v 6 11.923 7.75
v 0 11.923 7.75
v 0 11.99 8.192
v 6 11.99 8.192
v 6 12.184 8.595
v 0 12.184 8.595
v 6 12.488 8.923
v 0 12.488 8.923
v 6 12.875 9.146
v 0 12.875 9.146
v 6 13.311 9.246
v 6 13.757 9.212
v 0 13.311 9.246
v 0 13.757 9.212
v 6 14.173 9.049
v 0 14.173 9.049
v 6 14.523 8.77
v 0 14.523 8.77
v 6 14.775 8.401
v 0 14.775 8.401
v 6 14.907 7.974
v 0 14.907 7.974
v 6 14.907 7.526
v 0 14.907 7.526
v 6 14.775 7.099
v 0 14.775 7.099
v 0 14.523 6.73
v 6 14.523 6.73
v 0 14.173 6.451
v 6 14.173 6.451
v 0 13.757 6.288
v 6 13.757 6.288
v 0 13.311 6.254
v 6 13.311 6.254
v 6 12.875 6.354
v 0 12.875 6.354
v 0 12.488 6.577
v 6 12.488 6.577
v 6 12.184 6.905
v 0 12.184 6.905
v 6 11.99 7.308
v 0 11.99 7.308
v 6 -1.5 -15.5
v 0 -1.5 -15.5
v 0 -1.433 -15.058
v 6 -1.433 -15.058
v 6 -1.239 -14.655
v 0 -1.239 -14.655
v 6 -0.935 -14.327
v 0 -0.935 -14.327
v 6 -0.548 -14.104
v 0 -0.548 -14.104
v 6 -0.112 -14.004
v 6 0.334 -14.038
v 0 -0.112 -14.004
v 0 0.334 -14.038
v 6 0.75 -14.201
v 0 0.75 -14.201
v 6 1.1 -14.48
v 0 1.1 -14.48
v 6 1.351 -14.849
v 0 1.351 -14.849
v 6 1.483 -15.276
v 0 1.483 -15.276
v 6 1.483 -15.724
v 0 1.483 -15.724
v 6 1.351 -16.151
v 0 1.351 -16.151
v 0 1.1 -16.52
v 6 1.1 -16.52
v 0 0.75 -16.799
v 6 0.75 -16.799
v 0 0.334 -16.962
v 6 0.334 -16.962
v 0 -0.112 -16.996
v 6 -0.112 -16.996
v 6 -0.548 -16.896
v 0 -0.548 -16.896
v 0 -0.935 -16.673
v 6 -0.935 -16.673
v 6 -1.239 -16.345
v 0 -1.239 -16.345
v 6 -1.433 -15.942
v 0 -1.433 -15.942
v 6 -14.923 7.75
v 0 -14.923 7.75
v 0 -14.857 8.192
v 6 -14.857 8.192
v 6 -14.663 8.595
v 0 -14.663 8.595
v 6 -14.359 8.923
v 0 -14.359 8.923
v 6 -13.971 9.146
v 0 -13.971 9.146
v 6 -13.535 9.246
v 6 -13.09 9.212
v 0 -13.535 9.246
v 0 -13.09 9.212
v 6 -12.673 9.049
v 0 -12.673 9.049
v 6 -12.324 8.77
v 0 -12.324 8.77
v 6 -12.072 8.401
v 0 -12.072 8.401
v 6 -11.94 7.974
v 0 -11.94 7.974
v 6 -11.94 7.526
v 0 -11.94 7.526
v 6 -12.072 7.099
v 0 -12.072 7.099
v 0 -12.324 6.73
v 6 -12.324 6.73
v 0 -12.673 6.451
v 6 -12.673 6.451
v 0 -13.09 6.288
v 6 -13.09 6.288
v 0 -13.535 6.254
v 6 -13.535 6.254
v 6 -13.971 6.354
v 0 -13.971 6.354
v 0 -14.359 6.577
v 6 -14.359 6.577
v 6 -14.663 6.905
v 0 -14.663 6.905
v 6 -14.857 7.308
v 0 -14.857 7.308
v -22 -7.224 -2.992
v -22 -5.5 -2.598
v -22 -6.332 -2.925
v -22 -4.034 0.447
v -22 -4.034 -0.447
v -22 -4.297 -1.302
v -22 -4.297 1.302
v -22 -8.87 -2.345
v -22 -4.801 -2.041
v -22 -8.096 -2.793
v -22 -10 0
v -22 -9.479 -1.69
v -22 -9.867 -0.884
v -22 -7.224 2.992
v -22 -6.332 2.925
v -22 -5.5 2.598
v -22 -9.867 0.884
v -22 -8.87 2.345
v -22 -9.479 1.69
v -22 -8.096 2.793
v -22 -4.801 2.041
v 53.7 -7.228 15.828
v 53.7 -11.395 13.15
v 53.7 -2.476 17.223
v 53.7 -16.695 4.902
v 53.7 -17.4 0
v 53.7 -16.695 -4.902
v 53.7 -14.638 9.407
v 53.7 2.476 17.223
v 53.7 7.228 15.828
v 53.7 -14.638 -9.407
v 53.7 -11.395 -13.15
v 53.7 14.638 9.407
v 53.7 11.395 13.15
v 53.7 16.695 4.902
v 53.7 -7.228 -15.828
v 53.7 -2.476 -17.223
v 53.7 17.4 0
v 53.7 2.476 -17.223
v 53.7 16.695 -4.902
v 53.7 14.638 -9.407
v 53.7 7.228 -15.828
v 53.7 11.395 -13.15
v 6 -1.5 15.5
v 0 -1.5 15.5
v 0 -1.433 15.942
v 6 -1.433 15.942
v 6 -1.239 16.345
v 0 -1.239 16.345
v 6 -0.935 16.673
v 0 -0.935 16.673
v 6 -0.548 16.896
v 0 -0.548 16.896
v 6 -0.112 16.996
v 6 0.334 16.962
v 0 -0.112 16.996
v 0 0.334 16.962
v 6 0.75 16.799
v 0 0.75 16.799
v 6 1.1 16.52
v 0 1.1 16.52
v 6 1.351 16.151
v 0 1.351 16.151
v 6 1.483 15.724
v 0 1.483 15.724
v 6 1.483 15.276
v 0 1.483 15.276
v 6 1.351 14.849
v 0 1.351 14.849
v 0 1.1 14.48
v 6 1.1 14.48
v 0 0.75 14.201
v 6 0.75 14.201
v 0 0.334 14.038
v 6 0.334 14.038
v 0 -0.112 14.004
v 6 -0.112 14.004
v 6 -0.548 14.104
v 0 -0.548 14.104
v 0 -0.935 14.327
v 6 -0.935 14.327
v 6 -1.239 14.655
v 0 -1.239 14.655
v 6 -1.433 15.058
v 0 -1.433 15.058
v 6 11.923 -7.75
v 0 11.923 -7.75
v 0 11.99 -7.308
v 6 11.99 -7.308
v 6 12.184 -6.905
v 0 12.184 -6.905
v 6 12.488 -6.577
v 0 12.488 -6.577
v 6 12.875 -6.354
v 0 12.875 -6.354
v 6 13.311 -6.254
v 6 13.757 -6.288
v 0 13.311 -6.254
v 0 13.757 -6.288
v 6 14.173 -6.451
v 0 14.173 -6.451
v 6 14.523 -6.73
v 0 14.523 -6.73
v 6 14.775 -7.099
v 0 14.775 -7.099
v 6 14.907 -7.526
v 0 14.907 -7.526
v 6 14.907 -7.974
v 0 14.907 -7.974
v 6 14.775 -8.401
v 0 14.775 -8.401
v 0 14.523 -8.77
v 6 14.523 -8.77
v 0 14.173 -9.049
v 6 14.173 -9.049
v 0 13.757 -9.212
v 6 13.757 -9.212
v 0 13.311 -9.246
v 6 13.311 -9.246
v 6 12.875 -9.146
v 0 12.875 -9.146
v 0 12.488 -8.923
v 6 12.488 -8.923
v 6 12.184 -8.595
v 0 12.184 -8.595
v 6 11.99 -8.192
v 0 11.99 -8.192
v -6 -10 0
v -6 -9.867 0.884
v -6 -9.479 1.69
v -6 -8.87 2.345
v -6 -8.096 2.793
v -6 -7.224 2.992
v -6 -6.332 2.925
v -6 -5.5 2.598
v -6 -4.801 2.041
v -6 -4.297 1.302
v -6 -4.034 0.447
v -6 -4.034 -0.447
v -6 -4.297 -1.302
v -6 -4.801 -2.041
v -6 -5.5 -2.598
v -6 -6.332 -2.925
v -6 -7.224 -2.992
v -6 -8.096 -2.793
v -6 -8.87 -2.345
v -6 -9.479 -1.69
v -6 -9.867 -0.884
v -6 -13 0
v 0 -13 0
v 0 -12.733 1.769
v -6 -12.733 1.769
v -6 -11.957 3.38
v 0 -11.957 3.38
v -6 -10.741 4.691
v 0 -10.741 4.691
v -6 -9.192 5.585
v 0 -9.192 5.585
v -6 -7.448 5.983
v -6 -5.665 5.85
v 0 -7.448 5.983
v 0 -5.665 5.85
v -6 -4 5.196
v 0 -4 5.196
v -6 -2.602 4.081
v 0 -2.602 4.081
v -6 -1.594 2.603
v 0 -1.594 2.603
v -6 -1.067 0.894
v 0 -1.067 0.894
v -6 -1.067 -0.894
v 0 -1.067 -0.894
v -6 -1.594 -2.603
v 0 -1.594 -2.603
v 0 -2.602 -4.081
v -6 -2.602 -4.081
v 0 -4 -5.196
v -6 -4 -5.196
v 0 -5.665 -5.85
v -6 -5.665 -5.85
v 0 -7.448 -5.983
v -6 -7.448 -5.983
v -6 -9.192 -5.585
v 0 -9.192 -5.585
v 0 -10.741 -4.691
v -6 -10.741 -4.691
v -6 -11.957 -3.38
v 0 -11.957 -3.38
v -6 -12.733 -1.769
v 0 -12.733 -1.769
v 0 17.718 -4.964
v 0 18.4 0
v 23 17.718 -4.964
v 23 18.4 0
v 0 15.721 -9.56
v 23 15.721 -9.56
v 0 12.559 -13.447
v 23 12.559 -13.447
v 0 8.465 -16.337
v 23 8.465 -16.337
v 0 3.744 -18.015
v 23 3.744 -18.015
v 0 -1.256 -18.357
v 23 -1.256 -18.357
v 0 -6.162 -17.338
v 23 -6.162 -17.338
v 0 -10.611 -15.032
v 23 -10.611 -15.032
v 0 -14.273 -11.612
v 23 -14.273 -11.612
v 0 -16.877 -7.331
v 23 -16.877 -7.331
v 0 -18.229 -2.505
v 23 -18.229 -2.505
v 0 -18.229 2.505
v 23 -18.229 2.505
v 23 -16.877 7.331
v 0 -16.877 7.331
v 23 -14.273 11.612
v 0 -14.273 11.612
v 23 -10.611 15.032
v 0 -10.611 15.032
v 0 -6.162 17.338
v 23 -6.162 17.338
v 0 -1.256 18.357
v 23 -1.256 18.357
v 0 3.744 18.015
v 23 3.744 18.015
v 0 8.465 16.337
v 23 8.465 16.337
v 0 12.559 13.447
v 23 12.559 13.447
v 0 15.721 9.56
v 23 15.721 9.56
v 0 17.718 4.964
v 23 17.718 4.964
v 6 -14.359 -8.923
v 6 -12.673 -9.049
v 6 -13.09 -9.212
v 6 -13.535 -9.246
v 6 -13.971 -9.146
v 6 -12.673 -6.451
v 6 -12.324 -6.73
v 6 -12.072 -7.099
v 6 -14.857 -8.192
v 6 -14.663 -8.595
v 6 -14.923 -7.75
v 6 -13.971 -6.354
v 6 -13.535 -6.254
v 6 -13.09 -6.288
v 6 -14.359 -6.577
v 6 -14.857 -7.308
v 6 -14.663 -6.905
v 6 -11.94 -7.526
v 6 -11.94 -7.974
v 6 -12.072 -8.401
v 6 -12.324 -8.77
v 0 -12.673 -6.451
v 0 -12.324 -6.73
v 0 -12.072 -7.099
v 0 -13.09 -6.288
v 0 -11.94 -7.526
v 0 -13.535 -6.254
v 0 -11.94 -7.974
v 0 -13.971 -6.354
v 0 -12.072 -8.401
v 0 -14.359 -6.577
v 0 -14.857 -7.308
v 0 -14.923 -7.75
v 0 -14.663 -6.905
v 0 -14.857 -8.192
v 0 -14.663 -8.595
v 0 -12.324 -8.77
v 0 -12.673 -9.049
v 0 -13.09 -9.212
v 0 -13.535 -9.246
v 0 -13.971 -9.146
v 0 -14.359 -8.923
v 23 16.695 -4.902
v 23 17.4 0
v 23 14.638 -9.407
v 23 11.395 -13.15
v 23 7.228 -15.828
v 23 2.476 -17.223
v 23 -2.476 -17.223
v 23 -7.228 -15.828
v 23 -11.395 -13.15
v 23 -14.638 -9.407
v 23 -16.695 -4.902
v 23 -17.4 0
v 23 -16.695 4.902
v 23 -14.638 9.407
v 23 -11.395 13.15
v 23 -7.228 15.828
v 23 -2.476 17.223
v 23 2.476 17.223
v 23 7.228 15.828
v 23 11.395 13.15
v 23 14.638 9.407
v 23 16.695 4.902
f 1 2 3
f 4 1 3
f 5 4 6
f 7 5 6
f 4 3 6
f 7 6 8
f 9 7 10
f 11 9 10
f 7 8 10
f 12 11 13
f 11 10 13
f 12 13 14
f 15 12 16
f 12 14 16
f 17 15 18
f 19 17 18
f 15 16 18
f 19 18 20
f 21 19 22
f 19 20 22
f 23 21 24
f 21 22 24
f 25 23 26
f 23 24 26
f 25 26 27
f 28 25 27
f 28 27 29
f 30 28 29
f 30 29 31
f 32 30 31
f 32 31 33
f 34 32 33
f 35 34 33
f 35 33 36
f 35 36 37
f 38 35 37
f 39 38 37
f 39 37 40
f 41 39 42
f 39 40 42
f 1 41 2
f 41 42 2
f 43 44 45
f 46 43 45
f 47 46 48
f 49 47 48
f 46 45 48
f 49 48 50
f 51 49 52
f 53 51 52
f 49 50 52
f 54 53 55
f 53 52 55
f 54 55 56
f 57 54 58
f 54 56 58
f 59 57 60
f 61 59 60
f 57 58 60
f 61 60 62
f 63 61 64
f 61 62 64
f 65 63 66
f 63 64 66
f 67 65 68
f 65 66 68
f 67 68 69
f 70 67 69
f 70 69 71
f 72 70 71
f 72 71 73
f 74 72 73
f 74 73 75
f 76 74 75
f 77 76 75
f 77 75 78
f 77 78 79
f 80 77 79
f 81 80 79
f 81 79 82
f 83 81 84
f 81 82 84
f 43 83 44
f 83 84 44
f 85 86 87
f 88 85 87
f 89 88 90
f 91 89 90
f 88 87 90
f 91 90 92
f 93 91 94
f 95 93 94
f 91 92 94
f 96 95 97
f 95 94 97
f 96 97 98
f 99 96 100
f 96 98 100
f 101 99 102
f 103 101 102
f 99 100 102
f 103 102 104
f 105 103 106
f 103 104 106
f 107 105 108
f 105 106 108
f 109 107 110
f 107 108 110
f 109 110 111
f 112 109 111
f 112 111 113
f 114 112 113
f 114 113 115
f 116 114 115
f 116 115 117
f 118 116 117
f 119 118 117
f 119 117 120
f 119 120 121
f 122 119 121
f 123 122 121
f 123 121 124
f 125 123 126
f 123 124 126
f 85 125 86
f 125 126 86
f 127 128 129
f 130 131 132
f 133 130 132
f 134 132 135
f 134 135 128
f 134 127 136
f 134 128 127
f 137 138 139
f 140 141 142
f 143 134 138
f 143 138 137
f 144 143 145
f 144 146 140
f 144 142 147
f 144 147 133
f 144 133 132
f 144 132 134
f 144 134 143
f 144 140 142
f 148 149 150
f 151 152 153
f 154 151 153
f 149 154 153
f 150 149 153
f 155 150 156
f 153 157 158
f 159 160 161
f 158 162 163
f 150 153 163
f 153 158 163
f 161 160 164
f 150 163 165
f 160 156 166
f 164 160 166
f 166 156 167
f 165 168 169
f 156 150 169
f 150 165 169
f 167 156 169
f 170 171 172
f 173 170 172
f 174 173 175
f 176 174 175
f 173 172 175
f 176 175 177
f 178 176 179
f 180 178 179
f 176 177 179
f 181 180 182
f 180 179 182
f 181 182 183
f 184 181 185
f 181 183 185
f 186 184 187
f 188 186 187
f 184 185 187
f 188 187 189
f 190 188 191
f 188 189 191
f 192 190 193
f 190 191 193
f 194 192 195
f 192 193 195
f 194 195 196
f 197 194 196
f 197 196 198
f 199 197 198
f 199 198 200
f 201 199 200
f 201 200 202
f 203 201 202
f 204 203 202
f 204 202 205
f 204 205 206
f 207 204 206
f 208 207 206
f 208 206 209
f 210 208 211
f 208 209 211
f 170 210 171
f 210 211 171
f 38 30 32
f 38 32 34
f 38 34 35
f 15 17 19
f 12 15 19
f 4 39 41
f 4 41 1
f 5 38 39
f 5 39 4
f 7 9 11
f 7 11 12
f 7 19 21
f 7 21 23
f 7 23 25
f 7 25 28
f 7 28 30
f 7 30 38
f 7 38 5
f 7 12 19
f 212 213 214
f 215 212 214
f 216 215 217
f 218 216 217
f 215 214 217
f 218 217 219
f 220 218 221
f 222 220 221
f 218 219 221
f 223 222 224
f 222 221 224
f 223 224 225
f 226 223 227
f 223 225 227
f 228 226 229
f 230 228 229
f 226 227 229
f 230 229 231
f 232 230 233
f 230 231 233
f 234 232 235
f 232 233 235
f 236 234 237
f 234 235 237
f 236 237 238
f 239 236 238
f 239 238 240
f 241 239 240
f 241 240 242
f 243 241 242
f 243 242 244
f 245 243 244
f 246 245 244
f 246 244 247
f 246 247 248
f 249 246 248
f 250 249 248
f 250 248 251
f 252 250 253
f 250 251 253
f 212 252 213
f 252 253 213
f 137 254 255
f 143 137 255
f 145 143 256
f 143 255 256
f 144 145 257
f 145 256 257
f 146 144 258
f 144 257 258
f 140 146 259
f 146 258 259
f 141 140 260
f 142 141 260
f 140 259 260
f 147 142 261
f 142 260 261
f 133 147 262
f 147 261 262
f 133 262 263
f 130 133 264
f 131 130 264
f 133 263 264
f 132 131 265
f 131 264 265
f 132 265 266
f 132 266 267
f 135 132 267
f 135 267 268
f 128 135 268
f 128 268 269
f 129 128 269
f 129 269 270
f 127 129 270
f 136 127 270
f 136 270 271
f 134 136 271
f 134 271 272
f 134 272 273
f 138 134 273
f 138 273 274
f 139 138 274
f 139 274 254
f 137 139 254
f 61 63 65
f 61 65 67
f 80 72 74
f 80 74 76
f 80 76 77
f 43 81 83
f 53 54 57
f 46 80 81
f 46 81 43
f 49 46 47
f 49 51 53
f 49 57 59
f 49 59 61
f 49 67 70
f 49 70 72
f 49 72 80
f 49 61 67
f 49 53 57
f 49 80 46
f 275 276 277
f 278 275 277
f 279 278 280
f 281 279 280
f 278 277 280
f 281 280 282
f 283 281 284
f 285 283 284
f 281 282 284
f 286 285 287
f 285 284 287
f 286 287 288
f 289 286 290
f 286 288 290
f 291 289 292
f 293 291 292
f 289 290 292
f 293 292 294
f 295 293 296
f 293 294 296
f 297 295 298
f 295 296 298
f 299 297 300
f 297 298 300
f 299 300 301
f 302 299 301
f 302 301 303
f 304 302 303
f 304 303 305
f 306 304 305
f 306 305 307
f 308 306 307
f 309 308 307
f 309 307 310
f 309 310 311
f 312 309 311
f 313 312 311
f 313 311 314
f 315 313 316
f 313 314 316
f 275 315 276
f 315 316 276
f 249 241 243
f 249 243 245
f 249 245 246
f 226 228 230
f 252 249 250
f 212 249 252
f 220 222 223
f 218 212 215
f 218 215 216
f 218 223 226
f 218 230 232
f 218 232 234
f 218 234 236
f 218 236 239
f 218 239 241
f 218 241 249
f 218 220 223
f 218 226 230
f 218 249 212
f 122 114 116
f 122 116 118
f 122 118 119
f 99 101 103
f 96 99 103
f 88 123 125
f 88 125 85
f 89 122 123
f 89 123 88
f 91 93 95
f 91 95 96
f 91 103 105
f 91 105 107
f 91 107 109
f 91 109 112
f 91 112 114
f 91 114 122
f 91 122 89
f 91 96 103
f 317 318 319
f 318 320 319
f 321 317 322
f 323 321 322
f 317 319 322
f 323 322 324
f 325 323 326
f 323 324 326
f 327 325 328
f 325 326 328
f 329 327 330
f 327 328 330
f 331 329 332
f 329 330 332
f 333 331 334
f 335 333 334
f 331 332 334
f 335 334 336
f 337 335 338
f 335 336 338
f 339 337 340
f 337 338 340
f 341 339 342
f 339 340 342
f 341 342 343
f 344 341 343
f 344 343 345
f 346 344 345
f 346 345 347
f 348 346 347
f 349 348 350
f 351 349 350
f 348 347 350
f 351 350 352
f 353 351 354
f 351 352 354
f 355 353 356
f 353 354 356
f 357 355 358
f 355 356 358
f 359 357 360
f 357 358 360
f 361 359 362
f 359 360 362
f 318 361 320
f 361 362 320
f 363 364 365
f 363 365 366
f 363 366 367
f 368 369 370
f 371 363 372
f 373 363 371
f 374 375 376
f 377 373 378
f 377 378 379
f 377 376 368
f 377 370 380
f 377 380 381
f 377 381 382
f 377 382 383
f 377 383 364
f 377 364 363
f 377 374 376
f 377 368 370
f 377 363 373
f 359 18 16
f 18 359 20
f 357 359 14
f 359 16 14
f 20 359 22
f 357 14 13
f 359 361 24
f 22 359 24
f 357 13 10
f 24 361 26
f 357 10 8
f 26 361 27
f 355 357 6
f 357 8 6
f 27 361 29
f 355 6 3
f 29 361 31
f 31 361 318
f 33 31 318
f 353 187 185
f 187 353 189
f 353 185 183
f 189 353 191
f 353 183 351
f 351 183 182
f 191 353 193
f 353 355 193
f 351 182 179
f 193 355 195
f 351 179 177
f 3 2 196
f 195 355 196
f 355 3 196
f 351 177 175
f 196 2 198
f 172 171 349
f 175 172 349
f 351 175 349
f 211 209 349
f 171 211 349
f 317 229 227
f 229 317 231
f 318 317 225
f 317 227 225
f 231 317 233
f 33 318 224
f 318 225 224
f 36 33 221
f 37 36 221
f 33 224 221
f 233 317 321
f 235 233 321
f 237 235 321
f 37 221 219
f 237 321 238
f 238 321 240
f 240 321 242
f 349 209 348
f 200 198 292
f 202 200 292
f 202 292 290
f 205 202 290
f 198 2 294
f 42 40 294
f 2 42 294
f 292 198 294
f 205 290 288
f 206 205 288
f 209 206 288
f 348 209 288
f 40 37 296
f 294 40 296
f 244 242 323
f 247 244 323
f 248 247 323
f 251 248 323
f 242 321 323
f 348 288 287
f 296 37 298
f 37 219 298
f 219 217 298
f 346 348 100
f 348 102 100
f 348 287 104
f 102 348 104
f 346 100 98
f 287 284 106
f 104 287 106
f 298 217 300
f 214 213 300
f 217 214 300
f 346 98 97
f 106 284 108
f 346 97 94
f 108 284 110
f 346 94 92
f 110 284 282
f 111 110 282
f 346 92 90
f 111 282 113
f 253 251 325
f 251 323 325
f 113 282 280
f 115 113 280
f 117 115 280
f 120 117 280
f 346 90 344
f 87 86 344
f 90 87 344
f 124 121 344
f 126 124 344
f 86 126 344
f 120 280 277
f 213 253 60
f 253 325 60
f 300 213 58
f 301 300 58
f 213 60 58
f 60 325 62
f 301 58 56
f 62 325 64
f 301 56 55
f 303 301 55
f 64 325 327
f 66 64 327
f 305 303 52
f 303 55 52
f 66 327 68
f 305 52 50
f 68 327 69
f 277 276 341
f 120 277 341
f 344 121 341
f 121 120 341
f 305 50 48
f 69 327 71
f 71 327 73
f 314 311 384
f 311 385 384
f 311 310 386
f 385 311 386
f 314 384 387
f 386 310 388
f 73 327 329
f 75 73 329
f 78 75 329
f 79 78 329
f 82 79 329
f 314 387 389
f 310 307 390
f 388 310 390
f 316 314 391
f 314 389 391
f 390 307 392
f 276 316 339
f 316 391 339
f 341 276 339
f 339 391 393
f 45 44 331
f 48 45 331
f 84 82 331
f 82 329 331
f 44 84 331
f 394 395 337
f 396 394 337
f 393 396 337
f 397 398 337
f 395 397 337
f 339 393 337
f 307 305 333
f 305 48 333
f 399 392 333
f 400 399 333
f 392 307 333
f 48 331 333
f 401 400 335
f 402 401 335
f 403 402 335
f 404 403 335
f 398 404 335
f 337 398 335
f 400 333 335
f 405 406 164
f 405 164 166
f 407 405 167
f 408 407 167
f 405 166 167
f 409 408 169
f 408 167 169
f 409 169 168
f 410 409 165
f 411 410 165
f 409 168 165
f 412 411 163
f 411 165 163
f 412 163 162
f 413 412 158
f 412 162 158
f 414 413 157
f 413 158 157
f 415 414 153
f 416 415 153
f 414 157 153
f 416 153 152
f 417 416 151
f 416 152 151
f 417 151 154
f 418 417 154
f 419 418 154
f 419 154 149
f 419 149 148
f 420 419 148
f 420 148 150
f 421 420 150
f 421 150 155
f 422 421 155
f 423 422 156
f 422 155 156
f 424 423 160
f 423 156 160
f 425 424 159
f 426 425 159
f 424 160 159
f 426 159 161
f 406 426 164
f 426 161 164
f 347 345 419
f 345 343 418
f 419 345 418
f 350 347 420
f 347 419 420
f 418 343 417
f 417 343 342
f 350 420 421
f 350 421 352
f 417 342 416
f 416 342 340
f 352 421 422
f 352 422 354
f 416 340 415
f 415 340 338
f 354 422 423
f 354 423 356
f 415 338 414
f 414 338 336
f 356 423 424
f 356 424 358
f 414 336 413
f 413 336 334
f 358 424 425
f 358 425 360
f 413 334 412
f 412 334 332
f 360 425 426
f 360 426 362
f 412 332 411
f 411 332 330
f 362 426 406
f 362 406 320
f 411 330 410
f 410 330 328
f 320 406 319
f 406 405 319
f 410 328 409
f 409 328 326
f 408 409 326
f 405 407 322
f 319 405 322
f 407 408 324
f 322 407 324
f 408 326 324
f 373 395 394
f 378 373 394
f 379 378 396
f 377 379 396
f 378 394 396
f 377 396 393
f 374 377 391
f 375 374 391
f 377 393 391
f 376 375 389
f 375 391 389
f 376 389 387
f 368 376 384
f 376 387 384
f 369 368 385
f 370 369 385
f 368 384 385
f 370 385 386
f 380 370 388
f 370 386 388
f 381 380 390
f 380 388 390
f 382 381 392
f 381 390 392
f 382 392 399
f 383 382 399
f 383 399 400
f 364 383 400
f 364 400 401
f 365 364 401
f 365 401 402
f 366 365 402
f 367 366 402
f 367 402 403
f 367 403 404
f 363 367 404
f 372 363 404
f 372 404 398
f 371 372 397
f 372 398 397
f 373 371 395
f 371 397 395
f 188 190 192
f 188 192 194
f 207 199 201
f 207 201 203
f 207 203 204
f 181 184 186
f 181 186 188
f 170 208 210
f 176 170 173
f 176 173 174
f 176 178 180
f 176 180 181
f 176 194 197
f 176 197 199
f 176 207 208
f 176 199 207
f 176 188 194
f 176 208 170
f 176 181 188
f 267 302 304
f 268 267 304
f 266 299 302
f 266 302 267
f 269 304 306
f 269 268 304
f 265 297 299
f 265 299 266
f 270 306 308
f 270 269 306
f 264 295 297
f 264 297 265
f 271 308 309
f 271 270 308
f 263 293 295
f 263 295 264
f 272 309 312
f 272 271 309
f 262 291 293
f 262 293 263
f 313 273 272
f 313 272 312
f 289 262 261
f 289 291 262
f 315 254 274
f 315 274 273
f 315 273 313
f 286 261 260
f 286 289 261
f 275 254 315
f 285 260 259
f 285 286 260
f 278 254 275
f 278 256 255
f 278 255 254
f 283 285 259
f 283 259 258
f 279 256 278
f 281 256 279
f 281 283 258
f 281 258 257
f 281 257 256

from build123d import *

# Parameters (mm, degrees)
SKETCH3_R           = 3
BOSS_EXTRUDE1_DEPTH = 22
SKETCH3_3_R         = 6
BOSS_EXTRUDE2_DEPTH = 6
SKETCH4_R           = 1.5
CUT_EXTRUDE1_DEPTH  = 6


with BuildPart() as part:
    # Sketch2 → Revolve1 (revolve)
    with BuildSketch(Plane.XY):
        Polygon((0, 0), (0, 18.4), (23, 18.4), (23, 17.4), (53.7, 17.4), (53.7, 0), align=None)
    revolve(axis=Axis((53.7, 0, 0), (-1, 0, 0)))

    # Sketch3 → Boss-Extrude1 (add)
    with BuildSketch(Plane.ZY):
        with Locations((0, -7)):
            Circle(SKETCH3_R)
    extrude(amount=BOSS_EXTRUDE1_DEPTH)

    # Sketch3<3> → Boss-Extrude2 (add)
    with BuildSketch(Plane.ZY):
        with Locations((0, -7)):
            Circle(SKETCH3_3_R)
    extrude(amount=BOSS_EXTRUDE2_DEPTH)

    # Sketch4 → Cut-Extrude1 (cut)
    with BuildSketch(Plane.ZY):
        with Locations((15.5, 0)):
            Circle(SKETCH4_R)
        with Locations((7.75, -13.423393759)):
            Circle(SKETCH4_R)
        with Locations((-7.75, -13.423393759)):
            Circle(SKETCH4_R)
        with Locations((-15.5, 0)):
            Circle(SKETCH4_R)
        with Locations((-7.75, 13.423393759)):
            Circle(SKETCH4_R)
        with Locations((7.75, 13.423393759)):
            Circle(SKETCH4_R)
    extrude(amount=-CUT_EXTRUDE1_DEPTH, mode=Mode.SUBTRACT)


solid = part.part
